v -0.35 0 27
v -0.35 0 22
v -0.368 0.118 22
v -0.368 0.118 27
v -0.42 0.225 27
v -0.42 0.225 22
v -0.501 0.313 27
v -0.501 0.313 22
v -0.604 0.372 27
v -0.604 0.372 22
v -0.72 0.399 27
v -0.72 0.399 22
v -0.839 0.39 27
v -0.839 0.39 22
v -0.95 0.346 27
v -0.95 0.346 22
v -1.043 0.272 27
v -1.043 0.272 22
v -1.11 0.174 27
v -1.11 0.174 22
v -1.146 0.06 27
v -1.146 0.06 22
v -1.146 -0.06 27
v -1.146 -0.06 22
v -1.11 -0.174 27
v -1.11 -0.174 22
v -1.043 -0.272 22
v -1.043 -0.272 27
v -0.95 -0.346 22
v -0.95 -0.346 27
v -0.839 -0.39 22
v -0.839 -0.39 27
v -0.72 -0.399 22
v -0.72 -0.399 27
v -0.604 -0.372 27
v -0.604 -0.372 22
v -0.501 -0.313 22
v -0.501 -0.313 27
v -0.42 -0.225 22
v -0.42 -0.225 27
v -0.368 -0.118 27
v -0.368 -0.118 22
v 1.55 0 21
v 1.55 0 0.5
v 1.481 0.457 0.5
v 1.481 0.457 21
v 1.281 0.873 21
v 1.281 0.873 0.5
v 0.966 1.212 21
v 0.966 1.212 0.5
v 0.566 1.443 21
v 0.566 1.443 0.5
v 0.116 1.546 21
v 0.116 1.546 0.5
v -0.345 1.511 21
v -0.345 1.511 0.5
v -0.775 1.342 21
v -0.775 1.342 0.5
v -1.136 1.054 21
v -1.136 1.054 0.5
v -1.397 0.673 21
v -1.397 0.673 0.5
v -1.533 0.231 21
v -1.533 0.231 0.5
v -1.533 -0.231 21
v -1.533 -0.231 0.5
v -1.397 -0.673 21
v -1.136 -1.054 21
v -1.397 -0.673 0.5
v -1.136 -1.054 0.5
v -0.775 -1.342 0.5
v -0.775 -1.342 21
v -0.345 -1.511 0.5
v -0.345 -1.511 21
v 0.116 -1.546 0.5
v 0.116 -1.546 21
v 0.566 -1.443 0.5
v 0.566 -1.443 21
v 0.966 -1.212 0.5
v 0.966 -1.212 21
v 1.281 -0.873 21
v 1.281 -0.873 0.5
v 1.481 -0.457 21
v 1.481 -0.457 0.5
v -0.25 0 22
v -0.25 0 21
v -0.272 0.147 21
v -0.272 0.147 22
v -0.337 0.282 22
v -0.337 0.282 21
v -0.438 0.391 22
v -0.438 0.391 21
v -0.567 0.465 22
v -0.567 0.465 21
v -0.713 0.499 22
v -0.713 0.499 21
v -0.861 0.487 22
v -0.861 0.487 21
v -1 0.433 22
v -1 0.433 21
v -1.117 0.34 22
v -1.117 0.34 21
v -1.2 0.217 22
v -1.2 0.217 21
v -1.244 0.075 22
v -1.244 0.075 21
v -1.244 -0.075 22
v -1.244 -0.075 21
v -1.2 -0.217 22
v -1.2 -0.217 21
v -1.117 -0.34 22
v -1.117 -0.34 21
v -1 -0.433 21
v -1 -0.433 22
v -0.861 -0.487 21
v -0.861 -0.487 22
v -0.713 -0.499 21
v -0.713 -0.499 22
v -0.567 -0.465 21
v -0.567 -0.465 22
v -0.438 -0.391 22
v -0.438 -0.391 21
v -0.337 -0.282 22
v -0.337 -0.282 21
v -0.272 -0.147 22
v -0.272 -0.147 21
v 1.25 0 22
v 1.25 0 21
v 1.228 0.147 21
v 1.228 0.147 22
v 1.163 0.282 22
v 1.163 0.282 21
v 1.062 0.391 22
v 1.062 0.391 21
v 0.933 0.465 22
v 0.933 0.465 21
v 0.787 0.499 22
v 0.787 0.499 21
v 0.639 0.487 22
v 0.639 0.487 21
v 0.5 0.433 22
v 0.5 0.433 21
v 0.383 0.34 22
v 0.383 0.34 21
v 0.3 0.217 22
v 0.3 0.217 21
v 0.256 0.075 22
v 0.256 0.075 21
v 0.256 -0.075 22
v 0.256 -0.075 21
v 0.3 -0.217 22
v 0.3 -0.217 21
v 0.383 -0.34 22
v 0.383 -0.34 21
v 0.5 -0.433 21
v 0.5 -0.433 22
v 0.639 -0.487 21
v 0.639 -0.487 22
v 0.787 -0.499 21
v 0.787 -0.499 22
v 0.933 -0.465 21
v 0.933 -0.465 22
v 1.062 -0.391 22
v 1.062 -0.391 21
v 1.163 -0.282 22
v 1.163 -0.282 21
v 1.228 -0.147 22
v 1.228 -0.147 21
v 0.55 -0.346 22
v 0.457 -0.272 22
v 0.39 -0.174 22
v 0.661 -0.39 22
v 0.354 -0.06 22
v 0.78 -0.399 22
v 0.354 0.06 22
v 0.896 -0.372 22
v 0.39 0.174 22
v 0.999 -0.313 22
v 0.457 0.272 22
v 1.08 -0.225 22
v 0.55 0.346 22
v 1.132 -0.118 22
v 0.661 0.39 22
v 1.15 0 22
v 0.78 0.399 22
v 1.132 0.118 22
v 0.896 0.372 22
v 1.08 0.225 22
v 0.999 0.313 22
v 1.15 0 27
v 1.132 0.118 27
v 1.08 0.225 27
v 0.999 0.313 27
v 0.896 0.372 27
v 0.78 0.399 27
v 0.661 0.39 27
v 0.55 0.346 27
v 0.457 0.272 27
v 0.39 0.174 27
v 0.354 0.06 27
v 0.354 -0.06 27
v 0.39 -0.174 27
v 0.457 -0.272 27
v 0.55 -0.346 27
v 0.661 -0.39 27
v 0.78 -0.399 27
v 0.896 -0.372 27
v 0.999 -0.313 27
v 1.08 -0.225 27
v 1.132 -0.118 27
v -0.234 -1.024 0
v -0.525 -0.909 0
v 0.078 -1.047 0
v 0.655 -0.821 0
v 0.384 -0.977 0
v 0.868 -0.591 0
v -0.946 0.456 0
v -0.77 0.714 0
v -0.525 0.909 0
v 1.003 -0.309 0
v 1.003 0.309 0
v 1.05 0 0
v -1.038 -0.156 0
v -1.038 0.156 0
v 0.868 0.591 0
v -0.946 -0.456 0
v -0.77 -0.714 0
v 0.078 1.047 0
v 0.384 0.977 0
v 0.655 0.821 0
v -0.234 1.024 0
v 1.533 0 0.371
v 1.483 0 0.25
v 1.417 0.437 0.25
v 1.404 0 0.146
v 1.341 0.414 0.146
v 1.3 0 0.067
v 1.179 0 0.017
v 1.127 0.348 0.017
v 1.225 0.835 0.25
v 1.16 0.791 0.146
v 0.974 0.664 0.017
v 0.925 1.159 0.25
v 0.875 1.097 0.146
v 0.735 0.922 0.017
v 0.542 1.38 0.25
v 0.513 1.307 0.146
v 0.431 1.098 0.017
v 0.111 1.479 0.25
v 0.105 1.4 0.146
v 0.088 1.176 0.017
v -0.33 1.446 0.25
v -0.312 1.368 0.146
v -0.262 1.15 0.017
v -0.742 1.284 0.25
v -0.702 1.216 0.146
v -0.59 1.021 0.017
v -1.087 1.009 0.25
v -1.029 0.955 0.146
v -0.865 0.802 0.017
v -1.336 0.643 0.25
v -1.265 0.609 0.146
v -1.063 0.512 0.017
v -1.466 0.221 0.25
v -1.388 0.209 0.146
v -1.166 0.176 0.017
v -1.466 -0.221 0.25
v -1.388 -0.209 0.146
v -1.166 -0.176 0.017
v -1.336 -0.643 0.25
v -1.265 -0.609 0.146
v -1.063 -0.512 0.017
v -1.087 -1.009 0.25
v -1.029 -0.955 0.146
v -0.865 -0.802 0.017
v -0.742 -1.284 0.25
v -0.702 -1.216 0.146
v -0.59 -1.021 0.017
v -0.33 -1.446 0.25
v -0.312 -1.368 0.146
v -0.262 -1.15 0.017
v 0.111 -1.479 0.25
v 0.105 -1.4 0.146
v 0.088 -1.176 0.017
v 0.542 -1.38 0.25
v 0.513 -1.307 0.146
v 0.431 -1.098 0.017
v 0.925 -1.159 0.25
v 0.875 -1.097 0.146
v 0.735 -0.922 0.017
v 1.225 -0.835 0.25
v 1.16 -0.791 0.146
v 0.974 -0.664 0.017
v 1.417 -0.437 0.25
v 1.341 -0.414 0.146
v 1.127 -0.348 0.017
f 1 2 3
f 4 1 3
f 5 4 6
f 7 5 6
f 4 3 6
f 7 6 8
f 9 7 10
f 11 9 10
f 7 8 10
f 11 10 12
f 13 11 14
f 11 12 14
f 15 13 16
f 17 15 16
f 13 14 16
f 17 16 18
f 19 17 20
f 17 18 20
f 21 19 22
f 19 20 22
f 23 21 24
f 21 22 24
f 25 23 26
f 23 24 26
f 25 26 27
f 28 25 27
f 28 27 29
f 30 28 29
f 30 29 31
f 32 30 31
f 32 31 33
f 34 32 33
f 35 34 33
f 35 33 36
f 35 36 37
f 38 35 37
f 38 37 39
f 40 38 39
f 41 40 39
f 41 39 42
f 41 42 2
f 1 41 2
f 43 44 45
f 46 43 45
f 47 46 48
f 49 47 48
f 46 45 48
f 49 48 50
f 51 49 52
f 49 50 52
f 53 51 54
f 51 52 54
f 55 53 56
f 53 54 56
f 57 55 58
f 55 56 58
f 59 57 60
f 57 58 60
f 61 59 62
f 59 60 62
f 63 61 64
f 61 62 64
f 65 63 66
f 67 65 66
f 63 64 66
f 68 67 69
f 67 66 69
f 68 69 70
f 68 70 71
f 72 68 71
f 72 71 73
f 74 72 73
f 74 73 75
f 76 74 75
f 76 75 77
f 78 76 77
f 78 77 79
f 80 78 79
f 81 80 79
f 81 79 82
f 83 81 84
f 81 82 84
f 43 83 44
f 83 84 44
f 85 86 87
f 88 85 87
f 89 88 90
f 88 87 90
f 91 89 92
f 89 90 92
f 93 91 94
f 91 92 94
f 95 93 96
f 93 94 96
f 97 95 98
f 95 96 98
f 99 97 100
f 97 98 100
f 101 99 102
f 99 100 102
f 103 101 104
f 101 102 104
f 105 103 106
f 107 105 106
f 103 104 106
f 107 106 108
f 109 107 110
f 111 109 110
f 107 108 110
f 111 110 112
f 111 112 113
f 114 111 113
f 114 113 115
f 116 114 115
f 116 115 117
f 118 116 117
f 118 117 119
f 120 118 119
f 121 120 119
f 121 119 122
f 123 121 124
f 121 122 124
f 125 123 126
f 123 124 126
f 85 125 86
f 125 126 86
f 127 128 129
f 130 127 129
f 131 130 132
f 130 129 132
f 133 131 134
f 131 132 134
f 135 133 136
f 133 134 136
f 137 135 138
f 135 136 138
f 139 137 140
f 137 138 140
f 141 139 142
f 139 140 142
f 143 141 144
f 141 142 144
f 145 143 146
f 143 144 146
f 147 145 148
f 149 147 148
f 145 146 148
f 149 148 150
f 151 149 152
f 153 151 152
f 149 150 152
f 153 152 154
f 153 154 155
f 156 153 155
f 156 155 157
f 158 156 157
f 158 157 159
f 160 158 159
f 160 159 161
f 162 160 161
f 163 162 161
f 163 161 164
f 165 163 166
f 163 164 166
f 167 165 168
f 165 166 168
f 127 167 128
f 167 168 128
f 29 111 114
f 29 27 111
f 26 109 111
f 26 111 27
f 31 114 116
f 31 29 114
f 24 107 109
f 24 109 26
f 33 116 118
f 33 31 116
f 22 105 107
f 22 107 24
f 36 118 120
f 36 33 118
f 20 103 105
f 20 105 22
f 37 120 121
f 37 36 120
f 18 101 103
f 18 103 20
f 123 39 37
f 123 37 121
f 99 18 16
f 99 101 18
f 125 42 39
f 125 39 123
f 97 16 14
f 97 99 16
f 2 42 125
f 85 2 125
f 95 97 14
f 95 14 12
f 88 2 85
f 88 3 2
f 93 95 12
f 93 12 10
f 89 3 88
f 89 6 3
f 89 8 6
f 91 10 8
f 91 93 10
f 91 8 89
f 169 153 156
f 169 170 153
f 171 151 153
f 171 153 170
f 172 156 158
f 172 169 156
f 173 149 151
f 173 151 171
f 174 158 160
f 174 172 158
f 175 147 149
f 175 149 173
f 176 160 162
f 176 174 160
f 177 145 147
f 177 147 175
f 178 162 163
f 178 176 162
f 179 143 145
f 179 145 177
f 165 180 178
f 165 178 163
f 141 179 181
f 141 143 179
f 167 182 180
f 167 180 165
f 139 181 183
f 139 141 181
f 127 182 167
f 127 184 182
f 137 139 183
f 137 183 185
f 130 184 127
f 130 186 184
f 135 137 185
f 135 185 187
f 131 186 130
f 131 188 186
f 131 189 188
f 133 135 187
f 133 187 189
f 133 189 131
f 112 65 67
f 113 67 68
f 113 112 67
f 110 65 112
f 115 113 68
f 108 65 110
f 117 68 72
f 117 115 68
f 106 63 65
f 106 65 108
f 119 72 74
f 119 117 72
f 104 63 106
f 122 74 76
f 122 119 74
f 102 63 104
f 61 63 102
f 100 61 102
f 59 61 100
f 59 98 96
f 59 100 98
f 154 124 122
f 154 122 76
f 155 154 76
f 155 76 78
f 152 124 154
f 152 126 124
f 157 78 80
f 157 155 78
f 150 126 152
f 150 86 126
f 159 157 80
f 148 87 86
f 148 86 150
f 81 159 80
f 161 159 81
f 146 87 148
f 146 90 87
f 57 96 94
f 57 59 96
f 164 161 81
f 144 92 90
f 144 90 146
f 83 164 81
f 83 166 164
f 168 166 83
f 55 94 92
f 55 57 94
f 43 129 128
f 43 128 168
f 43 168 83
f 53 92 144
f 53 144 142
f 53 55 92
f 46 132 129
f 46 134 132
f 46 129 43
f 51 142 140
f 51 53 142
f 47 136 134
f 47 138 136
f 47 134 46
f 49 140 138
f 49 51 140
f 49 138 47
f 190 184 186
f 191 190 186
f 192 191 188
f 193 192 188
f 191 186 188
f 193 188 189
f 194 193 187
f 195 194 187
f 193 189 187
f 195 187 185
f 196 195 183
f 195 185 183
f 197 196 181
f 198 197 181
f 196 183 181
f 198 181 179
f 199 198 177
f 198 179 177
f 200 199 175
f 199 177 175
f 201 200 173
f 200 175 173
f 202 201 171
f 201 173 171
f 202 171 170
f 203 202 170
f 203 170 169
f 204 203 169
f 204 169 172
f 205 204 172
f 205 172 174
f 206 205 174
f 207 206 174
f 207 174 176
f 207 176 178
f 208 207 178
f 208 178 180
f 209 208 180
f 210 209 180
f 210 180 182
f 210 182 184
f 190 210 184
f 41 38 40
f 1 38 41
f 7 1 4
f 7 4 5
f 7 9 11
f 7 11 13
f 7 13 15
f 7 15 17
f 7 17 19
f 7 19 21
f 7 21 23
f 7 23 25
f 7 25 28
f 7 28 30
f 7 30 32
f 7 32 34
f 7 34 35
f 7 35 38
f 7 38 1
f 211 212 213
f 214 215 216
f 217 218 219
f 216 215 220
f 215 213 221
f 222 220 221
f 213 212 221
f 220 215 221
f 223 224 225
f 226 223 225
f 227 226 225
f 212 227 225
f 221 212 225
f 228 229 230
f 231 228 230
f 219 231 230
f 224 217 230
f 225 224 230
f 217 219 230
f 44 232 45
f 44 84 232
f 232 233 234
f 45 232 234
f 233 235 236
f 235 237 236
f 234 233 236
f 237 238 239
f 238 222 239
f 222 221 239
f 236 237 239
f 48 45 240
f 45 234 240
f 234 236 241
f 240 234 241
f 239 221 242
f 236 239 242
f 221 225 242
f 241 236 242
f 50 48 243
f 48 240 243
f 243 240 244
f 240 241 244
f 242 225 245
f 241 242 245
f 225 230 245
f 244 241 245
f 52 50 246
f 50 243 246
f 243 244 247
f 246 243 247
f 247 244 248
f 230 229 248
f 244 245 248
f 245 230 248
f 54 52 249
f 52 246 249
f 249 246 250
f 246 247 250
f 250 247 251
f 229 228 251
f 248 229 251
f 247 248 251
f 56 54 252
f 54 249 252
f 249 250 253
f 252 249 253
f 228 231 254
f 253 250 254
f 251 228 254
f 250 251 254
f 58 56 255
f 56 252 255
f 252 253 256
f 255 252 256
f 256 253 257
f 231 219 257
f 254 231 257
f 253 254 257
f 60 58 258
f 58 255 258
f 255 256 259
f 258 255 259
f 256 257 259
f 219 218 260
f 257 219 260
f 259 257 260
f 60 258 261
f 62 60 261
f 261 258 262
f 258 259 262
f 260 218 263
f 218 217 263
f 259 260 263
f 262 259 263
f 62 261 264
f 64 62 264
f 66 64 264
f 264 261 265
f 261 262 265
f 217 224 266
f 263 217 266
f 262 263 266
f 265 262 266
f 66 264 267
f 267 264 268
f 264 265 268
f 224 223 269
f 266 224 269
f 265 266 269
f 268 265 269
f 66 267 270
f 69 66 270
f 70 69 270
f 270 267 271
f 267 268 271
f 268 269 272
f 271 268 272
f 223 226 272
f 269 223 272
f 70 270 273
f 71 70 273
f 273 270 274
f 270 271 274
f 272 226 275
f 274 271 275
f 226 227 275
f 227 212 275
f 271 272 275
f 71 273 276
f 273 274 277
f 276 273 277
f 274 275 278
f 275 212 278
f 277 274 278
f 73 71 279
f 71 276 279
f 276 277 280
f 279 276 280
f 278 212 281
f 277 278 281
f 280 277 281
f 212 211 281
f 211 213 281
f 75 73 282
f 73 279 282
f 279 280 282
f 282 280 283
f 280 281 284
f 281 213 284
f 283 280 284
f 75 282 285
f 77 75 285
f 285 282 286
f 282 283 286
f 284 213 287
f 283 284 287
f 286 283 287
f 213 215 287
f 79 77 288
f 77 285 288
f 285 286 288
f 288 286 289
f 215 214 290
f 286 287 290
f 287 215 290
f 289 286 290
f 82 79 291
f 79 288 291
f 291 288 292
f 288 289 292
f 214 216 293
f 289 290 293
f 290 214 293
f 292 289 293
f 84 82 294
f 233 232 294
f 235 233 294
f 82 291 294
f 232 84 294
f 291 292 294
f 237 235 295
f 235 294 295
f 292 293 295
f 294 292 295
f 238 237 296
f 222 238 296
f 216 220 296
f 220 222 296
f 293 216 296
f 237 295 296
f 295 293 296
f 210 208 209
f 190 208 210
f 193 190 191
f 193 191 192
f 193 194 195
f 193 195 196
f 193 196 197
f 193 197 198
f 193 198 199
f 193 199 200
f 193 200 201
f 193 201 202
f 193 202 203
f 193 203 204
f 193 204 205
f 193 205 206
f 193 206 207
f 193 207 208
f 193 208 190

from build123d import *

# Parameters (mm, degrees)
CROQUIS1_R              = 1.55
SALIENTE_EXTRUIR1_DEPTH = 21
CROQUIS2_R              = 0.4
SALIENTE_EXTRUIR2_DEPTH = 6
CROQUIS3_R              = 0.5
CROQUIS3_R_2            = 0.4
SALIENTE_EXTRUIR3_DEPTH = 1
REDONDEO1_R             = 0.5


with BuildPart() as part:
    # Croquis1 → Saliente-Extruir1 (new body)
    with BuildSketch(Plane.XY):
        Circle(CROQUIS1_R)
    extrude(amount=SALIENTE_EXTRUIR1_DEPTH)

    # Croquis2 → Saliente-Extruir2 (add)
    with BuildSketch(Plane.XY.offset(21)):
        with Locations((0.75, 0)):
            Circle(CROQUIS2_R)
        with Locations((-0.75, 0)):
            Circle(CROQUIS2_R)
    extrude(amount=SALIENTE_EXTRUIR2_DEPTH)

    # Croquis3 → Saliente-Extruir3 (add)
    with BuildSketch(Plane.XY.offset(21)):
        with Locations((-0.75, 0)):
            Circle(CROQUIS3_R)
        with Locations((-0.75, 0)):
            Circle(CROQUIS3_R_2, mode=Mode.SUBTRACT)
        with Locations((0.75, 0)):
            Circle(CROQUIS3_R)
        with Locations((0.75, 0)):
            Circle(CROQUIS3_R_2, mode=Mode.SUBTRACT)
    extrude(amount=SALIENTE_EXTRUIR3_DEPTH)

    # Redondeo1
    redondeo1_edges = [part.edges().sort_by_distance(p)[0] for p in [
        (-1.55, 0, 0),
    ]]
    fillet(redondeo1_edges, radius=REDONDEO1_R)


solid = part.part
